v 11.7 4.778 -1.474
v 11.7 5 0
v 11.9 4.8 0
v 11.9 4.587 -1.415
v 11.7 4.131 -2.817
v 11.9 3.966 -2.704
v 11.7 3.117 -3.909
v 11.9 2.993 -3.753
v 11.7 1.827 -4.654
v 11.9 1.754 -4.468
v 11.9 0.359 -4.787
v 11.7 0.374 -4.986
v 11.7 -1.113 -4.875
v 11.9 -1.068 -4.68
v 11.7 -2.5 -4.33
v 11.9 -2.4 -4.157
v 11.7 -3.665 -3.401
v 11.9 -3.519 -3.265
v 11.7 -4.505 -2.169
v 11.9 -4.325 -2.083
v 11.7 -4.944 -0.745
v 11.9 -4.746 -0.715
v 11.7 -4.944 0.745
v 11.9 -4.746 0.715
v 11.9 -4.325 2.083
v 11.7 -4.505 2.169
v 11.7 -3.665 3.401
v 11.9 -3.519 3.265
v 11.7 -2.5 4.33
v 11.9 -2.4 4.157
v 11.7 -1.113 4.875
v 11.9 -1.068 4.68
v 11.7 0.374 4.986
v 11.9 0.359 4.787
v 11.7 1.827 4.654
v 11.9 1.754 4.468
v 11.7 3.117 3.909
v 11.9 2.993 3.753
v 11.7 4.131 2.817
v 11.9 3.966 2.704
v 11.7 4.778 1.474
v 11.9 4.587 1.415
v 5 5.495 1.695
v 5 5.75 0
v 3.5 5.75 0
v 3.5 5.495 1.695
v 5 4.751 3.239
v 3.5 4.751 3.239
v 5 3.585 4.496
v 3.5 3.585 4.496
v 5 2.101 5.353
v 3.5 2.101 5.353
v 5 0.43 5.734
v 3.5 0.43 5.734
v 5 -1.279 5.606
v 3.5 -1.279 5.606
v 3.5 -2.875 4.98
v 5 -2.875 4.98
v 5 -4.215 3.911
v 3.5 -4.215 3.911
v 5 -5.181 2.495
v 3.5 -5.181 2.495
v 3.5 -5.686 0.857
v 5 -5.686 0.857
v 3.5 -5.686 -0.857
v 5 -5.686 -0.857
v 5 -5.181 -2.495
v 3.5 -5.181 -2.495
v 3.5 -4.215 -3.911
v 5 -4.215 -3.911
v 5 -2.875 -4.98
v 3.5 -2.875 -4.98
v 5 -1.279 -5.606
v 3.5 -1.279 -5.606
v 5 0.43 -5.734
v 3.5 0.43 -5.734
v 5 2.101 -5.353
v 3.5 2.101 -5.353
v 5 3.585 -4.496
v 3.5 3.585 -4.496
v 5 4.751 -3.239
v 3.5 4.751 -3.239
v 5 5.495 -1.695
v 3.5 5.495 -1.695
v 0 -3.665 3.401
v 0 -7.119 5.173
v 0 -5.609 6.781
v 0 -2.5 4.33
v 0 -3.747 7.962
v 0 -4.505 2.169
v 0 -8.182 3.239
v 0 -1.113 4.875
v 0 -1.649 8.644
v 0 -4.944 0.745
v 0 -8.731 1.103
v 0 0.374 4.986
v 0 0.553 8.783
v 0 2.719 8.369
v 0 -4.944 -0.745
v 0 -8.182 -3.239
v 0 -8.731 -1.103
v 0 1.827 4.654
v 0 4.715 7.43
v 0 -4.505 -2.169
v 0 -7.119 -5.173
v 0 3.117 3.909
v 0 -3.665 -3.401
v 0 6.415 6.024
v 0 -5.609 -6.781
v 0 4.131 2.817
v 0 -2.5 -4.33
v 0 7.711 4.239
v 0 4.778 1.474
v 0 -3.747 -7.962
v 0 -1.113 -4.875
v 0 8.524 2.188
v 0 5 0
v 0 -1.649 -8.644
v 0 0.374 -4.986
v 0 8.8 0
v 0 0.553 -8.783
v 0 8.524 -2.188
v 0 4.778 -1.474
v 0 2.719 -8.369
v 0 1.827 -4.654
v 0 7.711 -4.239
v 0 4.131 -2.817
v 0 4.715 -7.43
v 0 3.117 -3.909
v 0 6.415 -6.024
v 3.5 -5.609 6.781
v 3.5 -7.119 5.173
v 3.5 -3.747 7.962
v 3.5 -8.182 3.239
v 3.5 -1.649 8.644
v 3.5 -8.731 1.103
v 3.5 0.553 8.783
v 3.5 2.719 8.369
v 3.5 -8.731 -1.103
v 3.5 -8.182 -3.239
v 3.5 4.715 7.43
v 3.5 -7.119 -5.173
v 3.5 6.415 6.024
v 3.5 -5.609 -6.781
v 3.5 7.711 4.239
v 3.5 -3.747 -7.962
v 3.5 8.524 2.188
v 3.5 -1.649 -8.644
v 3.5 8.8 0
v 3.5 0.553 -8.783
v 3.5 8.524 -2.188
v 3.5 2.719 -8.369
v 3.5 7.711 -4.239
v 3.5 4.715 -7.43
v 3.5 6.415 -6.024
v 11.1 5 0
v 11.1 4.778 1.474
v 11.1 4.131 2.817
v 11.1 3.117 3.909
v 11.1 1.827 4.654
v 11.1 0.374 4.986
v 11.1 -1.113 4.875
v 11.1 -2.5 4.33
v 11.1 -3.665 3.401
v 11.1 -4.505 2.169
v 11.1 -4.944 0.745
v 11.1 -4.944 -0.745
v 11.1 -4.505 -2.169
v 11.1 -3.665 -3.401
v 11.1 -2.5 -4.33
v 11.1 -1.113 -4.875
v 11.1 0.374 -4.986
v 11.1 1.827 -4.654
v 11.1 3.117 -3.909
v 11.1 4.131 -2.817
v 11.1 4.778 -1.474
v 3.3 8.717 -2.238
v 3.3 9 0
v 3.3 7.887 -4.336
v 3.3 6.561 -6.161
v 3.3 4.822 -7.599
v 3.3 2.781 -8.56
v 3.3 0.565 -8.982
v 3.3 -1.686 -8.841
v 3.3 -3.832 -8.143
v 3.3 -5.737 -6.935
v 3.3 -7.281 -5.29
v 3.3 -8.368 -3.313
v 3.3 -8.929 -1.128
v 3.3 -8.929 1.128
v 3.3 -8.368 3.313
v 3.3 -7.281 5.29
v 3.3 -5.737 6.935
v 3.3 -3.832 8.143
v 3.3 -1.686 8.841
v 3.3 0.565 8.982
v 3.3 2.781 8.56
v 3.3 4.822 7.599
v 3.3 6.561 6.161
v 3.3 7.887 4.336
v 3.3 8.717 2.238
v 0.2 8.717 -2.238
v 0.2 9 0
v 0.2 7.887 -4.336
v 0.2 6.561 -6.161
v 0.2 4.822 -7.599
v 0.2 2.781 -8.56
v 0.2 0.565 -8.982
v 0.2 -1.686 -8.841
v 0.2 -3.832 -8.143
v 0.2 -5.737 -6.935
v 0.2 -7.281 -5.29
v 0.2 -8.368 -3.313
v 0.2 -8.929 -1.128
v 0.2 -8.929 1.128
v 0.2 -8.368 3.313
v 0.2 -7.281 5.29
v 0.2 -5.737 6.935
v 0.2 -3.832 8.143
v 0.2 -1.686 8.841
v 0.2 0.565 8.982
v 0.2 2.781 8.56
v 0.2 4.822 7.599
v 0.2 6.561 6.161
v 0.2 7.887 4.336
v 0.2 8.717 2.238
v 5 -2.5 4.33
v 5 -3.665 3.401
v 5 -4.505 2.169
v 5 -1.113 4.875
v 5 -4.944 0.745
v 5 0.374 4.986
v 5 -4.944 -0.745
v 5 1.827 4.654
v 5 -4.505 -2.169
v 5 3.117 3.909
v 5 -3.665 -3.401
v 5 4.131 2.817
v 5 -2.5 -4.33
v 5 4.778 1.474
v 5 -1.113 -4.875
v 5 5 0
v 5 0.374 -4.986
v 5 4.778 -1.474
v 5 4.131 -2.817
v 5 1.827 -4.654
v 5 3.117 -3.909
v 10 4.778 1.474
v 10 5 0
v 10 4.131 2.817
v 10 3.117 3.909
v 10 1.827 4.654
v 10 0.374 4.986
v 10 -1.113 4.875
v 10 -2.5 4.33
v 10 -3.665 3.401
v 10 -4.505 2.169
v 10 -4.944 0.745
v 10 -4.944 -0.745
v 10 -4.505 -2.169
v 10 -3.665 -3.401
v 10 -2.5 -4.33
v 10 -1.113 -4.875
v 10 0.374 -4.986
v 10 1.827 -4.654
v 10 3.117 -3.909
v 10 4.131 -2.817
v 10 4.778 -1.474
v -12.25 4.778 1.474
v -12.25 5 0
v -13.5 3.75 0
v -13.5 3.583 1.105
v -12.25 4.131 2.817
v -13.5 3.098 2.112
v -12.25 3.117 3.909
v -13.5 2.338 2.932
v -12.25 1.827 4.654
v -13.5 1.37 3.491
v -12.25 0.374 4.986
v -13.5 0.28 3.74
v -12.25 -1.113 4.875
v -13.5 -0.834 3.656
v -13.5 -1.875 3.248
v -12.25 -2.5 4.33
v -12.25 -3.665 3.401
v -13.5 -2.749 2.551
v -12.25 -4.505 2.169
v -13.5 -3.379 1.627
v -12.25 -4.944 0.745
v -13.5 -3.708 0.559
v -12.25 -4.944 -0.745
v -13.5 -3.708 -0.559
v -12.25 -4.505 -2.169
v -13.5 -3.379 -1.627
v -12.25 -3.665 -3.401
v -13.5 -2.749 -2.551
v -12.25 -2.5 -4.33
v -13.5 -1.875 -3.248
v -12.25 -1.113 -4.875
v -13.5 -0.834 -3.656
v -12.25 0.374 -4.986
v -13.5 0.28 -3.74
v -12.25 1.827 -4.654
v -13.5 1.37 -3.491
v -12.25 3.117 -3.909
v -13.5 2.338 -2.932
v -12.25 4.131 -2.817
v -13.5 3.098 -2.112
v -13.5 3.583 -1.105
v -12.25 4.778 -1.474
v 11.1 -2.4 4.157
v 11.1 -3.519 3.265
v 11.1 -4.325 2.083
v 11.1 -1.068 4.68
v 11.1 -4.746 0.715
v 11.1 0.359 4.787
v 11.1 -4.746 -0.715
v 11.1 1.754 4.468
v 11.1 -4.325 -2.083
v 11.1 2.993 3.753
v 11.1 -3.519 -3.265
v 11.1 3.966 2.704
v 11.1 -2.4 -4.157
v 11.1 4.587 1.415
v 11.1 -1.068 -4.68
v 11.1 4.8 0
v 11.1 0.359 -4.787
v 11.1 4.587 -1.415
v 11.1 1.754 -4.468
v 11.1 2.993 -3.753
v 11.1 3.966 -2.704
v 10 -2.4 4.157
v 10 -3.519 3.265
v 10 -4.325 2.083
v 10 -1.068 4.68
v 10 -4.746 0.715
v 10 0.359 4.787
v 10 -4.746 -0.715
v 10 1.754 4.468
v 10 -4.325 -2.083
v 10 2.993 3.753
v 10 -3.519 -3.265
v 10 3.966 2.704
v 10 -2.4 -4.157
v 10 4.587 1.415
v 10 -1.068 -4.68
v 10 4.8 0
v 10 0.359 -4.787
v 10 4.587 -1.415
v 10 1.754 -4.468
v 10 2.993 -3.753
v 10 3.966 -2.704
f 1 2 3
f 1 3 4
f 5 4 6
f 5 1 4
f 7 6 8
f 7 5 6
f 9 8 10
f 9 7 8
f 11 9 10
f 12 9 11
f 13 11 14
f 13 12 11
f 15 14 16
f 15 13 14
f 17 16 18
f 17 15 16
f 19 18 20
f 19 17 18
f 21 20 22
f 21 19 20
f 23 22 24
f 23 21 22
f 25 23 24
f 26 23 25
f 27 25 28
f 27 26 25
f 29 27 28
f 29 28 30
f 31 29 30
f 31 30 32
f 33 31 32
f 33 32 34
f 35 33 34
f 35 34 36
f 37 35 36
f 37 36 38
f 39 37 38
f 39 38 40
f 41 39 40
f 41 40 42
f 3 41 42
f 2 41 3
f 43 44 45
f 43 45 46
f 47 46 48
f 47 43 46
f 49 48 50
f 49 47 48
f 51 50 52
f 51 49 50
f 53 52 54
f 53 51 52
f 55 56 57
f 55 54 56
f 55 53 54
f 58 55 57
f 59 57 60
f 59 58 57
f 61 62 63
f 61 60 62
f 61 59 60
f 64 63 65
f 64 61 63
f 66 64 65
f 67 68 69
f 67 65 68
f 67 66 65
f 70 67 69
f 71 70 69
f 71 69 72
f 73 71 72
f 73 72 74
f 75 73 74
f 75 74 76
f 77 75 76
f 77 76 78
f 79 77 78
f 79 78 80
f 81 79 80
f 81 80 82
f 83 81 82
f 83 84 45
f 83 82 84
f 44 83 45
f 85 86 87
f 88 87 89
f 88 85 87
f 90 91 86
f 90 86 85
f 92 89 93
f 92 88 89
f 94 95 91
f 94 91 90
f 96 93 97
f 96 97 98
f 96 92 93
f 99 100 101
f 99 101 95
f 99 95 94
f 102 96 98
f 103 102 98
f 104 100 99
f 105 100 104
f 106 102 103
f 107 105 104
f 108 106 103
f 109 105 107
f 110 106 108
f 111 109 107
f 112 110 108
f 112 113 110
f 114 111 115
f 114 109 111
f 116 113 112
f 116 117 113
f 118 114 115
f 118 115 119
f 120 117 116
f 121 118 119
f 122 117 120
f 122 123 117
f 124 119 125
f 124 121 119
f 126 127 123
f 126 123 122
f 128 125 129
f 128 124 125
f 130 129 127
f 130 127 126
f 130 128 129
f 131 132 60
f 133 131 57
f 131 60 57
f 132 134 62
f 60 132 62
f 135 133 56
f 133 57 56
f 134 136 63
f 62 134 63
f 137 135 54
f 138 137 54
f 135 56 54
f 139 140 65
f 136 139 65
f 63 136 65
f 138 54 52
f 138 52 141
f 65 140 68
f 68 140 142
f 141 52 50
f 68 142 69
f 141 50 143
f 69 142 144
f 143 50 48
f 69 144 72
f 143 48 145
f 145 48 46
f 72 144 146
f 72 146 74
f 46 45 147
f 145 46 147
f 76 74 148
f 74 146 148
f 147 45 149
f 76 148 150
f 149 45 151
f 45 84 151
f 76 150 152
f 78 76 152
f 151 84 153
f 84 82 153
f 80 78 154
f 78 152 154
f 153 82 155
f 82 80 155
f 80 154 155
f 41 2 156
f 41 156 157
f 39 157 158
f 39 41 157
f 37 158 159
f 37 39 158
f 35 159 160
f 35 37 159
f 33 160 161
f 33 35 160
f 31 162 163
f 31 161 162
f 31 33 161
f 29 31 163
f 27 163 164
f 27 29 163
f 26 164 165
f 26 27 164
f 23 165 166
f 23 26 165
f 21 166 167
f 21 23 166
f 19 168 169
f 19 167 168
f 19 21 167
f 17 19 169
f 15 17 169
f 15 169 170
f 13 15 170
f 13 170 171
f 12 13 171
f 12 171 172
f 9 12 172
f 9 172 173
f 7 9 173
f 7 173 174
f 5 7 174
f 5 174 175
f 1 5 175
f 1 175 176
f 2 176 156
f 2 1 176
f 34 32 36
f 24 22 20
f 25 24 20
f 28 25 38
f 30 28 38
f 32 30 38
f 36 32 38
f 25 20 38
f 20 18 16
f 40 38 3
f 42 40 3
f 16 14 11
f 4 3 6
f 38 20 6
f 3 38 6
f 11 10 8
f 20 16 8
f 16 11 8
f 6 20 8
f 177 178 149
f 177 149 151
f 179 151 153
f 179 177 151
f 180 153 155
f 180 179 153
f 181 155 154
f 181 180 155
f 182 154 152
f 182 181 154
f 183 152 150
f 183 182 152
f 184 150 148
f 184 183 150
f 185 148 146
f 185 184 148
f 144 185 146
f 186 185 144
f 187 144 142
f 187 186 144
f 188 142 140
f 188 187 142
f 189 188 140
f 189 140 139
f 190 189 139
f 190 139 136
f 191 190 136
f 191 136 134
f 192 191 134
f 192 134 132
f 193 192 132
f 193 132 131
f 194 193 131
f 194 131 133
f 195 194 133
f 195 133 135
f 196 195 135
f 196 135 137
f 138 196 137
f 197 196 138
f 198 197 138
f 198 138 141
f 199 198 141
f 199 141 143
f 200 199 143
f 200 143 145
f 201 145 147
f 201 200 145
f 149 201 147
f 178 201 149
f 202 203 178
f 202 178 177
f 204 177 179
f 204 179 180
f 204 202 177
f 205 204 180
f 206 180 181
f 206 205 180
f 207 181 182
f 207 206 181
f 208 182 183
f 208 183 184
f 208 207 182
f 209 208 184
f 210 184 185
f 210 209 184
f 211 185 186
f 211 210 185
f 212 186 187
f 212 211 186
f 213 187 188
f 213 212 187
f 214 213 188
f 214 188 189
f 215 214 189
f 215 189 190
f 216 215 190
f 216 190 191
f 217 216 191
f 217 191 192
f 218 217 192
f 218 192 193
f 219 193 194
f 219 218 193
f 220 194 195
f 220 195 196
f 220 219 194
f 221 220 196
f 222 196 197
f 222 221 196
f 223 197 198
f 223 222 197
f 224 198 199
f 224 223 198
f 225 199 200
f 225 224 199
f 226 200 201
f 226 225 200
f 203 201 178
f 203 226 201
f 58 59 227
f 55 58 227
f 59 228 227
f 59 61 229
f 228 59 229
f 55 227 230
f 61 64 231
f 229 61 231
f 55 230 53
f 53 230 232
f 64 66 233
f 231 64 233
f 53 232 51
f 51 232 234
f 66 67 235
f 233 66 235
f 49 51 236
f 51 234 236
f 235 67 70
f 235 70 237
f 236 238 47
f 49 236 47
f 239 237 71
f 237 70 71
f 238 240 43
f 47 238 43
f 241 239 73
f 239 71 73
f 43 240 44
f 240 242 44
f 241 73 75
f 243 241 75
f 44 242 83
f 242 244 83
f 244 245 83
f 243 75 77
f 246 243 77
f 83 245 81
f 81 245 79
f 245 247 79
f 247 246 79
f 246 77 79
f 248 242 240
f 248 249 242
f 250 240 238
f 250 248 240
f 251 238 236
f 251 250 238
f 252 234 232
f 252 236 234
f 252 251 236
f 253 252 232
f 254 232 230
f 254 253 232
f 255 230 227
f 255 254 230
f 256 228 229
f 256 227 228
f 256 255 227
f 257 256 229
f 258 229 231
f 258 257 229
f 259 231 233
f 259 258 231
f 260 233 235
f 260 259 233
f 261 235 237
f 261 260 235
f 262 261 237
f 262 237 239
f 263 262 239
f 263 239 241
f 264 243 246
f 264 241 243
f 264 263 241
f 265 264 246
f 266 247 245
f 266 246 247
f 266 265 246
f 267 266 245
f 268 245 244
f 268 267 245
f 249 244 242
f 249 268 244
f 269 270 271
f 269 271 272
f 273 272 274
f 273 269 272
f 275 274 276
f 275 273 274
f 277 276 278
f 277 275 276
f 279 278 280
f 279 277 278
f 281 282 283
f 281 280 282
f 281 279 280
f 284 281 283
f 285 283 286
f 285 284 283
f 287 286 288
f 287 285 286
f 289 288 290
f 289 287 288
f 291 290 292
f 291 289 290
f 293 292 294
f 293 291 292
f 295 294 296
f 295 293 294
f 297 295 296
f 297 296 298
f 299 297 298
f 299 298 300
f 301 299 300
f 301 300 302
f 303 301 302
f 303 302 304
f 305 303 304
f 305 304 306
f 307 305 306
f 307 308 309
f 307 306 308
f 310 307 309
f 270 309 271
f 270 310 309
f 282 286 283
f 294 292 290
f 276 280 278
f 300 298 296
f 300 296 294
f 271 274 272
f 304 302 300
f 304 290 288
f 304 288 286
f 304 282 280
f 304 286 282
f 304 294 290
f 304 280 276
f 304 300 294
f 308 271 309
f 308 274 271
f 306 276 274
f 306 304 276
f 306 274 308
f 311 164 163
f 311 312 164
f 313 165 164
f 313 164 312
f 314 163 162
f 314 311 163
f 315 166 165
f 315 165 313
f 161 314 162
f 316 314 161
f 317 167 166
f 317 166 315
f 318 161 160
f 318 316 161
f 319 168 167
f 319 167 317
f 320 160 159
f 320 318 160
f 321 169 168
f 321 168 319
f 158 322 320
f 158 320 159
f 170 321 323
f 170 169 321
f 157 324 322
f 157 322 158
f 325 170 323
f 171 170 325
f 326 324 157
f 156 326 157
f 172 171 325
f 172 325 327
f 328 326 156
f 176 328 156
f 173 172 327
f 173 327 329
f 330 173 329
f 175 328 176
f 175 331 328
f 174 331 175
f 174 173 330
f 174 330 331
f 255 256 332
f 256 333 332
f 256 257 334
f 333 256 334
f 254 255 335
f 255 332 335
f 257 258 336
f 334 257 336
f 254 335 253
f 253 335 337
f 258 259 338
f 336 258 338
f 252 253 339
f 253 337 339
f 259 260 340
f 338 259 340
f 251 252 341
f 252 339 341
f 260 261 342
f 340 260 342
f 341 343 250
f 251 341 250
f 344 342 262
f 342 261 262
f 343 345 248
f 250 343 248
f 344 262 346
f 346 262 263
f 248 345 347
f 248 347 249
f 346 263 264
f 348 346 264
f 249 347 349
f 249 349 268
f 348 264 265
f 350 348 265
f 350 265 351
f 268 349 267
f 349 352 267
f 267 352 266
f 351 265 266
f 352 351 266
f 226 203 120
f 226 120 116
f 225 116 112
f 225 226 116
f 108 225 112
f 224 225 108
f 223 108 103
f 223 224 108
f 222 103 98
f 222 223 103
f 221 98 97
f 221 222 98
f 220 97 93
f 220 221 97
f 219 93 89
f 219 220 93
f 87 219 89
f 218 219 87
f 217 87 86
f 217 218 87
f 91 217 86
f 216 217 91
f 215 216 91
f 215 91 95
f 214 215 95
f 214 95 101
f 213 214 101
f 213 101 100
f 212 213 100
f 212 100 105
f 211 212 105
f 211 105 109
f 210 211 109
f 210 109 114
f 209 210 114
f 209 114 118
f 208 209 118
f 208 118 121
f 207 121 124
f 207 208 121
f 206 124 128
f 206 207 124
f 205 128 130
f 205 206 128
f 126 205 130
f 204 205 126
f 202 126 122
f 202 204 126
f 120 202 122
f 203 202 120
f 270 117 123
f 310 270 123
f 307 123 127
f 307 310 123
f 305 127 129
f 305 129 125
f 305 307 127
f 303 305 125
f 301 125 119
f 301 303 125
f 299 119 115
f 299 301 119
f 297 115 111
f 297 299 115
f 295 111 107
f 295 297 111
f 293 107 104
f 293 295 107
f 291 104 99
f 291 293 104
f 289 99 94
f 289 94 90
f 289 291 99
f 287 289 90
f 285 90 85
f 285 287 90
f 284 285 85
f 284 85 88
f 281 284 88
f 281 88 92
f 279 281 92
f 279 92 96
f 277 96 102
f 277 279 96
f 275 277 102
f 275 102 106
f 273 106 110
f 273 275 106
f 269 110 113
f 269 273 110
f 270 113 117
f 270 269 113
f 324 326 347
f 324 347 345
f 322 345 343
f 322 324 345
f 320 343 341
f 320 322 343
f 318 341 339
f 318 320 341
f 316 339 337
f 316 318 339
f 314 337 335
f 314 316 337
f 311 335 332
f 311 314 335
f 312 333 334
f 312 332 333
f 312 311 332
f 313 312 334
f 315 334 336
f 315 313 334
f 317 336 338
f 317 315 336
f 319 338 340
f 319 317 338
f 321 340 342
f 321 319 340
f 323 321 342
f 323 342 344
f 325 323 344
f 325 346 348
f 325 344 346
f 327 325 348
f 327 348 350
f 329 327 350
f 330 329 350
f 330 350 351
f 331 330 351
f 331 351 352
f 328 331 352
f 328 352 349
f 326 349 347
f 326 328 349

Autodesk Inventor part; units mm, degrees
ref_plane "YZ Plane" through (0, 0, 0) normal (1, 0, 0) x (0, 1, 0)
ref_plane "XZ Plane" through (0, 0, 0) normal (0, 1, 0) x (-1, 0, 0)
ref_plane "XY Plane" through (0, 0, 0) normal (0, 0, 1) x (1, 0, 0)
sketch "Skizze1" plane through (0, 0, 0) normal (0, 0, 1) x (1, 0, 0)
  line L0 (0, 0) -> (0, 9)
  line L1 (3.5, 9) -> (3.5, 5)
  line L2 (3.5, 5) -> (10, 5)
  line L3 (10, 5) -> (10, 4.8)
  line L4 (10, 4.8) -> (11.1, 4.8)
  line L5 (11.1, 4.8) -> (11.1, 5)
  line L6 (11.1, 5) -> (11.7, 5)
  line L7 (11.9, 4.8) -> (11.9, 0)
  line L8 (11.9, 0) -> (0, 0)
  line L9 (11.7, 5) -> (11.9, 4.8)
  line L10 (0, 5) -> (-13.5, 5)
  line L11 (-13.5, 5) -> (-13.5, 0)
  line L12 (-13.5, 0) -> (0, 0)
  line L13 (3.5, 9) -> (0, 9)
  line L14 (5, 5) -> (5, 0) construction
  line L15 (3.5, 5.75) -> (5, 5.75)
  line L16 (5, 5.75) -> (5, 5)
  point P0 (11.9, 5)
  dimension "d0" = 9.6
  dimension "d1" = 10
  dimension "d2" = 1.1
  dimension "d3" = 0.2
  dimension "d4" = 0.2
  dimension "d5" = 0.6
  dimension "Gabel_FixationShaft_Contact_Thickness" = 3.5
  dimension "d29" = 10
  dimension "d30" = 13.5
  dimension "d37" = 18
  dimension "d39" = 5
  dimension "d40" = 1.5
  dimension "d41" = 11.5
revolve "Umdrehung1" add sketch "Skizze1" angle 360 about axis through (11.9, 0, 0) along (-1, 0, 0)
chamfer "Fase1" distance 0.2 angle 45 2 edges at (3.5, -9, 0) (0, -9, 0)
chamfer "Fase2" distance 1.25 angle 45 1 edges at (-13.5, -5, 0)
thread "Gewinde1" size "M10x1.5" class "6g" standard "ANSI Metric M Profile" full length
equation "\"d3\" = d4"
properties part number "ParallelMecha_Gabel_Connection_JointShaft_Rillenkugellager" material "Edelstahl"
